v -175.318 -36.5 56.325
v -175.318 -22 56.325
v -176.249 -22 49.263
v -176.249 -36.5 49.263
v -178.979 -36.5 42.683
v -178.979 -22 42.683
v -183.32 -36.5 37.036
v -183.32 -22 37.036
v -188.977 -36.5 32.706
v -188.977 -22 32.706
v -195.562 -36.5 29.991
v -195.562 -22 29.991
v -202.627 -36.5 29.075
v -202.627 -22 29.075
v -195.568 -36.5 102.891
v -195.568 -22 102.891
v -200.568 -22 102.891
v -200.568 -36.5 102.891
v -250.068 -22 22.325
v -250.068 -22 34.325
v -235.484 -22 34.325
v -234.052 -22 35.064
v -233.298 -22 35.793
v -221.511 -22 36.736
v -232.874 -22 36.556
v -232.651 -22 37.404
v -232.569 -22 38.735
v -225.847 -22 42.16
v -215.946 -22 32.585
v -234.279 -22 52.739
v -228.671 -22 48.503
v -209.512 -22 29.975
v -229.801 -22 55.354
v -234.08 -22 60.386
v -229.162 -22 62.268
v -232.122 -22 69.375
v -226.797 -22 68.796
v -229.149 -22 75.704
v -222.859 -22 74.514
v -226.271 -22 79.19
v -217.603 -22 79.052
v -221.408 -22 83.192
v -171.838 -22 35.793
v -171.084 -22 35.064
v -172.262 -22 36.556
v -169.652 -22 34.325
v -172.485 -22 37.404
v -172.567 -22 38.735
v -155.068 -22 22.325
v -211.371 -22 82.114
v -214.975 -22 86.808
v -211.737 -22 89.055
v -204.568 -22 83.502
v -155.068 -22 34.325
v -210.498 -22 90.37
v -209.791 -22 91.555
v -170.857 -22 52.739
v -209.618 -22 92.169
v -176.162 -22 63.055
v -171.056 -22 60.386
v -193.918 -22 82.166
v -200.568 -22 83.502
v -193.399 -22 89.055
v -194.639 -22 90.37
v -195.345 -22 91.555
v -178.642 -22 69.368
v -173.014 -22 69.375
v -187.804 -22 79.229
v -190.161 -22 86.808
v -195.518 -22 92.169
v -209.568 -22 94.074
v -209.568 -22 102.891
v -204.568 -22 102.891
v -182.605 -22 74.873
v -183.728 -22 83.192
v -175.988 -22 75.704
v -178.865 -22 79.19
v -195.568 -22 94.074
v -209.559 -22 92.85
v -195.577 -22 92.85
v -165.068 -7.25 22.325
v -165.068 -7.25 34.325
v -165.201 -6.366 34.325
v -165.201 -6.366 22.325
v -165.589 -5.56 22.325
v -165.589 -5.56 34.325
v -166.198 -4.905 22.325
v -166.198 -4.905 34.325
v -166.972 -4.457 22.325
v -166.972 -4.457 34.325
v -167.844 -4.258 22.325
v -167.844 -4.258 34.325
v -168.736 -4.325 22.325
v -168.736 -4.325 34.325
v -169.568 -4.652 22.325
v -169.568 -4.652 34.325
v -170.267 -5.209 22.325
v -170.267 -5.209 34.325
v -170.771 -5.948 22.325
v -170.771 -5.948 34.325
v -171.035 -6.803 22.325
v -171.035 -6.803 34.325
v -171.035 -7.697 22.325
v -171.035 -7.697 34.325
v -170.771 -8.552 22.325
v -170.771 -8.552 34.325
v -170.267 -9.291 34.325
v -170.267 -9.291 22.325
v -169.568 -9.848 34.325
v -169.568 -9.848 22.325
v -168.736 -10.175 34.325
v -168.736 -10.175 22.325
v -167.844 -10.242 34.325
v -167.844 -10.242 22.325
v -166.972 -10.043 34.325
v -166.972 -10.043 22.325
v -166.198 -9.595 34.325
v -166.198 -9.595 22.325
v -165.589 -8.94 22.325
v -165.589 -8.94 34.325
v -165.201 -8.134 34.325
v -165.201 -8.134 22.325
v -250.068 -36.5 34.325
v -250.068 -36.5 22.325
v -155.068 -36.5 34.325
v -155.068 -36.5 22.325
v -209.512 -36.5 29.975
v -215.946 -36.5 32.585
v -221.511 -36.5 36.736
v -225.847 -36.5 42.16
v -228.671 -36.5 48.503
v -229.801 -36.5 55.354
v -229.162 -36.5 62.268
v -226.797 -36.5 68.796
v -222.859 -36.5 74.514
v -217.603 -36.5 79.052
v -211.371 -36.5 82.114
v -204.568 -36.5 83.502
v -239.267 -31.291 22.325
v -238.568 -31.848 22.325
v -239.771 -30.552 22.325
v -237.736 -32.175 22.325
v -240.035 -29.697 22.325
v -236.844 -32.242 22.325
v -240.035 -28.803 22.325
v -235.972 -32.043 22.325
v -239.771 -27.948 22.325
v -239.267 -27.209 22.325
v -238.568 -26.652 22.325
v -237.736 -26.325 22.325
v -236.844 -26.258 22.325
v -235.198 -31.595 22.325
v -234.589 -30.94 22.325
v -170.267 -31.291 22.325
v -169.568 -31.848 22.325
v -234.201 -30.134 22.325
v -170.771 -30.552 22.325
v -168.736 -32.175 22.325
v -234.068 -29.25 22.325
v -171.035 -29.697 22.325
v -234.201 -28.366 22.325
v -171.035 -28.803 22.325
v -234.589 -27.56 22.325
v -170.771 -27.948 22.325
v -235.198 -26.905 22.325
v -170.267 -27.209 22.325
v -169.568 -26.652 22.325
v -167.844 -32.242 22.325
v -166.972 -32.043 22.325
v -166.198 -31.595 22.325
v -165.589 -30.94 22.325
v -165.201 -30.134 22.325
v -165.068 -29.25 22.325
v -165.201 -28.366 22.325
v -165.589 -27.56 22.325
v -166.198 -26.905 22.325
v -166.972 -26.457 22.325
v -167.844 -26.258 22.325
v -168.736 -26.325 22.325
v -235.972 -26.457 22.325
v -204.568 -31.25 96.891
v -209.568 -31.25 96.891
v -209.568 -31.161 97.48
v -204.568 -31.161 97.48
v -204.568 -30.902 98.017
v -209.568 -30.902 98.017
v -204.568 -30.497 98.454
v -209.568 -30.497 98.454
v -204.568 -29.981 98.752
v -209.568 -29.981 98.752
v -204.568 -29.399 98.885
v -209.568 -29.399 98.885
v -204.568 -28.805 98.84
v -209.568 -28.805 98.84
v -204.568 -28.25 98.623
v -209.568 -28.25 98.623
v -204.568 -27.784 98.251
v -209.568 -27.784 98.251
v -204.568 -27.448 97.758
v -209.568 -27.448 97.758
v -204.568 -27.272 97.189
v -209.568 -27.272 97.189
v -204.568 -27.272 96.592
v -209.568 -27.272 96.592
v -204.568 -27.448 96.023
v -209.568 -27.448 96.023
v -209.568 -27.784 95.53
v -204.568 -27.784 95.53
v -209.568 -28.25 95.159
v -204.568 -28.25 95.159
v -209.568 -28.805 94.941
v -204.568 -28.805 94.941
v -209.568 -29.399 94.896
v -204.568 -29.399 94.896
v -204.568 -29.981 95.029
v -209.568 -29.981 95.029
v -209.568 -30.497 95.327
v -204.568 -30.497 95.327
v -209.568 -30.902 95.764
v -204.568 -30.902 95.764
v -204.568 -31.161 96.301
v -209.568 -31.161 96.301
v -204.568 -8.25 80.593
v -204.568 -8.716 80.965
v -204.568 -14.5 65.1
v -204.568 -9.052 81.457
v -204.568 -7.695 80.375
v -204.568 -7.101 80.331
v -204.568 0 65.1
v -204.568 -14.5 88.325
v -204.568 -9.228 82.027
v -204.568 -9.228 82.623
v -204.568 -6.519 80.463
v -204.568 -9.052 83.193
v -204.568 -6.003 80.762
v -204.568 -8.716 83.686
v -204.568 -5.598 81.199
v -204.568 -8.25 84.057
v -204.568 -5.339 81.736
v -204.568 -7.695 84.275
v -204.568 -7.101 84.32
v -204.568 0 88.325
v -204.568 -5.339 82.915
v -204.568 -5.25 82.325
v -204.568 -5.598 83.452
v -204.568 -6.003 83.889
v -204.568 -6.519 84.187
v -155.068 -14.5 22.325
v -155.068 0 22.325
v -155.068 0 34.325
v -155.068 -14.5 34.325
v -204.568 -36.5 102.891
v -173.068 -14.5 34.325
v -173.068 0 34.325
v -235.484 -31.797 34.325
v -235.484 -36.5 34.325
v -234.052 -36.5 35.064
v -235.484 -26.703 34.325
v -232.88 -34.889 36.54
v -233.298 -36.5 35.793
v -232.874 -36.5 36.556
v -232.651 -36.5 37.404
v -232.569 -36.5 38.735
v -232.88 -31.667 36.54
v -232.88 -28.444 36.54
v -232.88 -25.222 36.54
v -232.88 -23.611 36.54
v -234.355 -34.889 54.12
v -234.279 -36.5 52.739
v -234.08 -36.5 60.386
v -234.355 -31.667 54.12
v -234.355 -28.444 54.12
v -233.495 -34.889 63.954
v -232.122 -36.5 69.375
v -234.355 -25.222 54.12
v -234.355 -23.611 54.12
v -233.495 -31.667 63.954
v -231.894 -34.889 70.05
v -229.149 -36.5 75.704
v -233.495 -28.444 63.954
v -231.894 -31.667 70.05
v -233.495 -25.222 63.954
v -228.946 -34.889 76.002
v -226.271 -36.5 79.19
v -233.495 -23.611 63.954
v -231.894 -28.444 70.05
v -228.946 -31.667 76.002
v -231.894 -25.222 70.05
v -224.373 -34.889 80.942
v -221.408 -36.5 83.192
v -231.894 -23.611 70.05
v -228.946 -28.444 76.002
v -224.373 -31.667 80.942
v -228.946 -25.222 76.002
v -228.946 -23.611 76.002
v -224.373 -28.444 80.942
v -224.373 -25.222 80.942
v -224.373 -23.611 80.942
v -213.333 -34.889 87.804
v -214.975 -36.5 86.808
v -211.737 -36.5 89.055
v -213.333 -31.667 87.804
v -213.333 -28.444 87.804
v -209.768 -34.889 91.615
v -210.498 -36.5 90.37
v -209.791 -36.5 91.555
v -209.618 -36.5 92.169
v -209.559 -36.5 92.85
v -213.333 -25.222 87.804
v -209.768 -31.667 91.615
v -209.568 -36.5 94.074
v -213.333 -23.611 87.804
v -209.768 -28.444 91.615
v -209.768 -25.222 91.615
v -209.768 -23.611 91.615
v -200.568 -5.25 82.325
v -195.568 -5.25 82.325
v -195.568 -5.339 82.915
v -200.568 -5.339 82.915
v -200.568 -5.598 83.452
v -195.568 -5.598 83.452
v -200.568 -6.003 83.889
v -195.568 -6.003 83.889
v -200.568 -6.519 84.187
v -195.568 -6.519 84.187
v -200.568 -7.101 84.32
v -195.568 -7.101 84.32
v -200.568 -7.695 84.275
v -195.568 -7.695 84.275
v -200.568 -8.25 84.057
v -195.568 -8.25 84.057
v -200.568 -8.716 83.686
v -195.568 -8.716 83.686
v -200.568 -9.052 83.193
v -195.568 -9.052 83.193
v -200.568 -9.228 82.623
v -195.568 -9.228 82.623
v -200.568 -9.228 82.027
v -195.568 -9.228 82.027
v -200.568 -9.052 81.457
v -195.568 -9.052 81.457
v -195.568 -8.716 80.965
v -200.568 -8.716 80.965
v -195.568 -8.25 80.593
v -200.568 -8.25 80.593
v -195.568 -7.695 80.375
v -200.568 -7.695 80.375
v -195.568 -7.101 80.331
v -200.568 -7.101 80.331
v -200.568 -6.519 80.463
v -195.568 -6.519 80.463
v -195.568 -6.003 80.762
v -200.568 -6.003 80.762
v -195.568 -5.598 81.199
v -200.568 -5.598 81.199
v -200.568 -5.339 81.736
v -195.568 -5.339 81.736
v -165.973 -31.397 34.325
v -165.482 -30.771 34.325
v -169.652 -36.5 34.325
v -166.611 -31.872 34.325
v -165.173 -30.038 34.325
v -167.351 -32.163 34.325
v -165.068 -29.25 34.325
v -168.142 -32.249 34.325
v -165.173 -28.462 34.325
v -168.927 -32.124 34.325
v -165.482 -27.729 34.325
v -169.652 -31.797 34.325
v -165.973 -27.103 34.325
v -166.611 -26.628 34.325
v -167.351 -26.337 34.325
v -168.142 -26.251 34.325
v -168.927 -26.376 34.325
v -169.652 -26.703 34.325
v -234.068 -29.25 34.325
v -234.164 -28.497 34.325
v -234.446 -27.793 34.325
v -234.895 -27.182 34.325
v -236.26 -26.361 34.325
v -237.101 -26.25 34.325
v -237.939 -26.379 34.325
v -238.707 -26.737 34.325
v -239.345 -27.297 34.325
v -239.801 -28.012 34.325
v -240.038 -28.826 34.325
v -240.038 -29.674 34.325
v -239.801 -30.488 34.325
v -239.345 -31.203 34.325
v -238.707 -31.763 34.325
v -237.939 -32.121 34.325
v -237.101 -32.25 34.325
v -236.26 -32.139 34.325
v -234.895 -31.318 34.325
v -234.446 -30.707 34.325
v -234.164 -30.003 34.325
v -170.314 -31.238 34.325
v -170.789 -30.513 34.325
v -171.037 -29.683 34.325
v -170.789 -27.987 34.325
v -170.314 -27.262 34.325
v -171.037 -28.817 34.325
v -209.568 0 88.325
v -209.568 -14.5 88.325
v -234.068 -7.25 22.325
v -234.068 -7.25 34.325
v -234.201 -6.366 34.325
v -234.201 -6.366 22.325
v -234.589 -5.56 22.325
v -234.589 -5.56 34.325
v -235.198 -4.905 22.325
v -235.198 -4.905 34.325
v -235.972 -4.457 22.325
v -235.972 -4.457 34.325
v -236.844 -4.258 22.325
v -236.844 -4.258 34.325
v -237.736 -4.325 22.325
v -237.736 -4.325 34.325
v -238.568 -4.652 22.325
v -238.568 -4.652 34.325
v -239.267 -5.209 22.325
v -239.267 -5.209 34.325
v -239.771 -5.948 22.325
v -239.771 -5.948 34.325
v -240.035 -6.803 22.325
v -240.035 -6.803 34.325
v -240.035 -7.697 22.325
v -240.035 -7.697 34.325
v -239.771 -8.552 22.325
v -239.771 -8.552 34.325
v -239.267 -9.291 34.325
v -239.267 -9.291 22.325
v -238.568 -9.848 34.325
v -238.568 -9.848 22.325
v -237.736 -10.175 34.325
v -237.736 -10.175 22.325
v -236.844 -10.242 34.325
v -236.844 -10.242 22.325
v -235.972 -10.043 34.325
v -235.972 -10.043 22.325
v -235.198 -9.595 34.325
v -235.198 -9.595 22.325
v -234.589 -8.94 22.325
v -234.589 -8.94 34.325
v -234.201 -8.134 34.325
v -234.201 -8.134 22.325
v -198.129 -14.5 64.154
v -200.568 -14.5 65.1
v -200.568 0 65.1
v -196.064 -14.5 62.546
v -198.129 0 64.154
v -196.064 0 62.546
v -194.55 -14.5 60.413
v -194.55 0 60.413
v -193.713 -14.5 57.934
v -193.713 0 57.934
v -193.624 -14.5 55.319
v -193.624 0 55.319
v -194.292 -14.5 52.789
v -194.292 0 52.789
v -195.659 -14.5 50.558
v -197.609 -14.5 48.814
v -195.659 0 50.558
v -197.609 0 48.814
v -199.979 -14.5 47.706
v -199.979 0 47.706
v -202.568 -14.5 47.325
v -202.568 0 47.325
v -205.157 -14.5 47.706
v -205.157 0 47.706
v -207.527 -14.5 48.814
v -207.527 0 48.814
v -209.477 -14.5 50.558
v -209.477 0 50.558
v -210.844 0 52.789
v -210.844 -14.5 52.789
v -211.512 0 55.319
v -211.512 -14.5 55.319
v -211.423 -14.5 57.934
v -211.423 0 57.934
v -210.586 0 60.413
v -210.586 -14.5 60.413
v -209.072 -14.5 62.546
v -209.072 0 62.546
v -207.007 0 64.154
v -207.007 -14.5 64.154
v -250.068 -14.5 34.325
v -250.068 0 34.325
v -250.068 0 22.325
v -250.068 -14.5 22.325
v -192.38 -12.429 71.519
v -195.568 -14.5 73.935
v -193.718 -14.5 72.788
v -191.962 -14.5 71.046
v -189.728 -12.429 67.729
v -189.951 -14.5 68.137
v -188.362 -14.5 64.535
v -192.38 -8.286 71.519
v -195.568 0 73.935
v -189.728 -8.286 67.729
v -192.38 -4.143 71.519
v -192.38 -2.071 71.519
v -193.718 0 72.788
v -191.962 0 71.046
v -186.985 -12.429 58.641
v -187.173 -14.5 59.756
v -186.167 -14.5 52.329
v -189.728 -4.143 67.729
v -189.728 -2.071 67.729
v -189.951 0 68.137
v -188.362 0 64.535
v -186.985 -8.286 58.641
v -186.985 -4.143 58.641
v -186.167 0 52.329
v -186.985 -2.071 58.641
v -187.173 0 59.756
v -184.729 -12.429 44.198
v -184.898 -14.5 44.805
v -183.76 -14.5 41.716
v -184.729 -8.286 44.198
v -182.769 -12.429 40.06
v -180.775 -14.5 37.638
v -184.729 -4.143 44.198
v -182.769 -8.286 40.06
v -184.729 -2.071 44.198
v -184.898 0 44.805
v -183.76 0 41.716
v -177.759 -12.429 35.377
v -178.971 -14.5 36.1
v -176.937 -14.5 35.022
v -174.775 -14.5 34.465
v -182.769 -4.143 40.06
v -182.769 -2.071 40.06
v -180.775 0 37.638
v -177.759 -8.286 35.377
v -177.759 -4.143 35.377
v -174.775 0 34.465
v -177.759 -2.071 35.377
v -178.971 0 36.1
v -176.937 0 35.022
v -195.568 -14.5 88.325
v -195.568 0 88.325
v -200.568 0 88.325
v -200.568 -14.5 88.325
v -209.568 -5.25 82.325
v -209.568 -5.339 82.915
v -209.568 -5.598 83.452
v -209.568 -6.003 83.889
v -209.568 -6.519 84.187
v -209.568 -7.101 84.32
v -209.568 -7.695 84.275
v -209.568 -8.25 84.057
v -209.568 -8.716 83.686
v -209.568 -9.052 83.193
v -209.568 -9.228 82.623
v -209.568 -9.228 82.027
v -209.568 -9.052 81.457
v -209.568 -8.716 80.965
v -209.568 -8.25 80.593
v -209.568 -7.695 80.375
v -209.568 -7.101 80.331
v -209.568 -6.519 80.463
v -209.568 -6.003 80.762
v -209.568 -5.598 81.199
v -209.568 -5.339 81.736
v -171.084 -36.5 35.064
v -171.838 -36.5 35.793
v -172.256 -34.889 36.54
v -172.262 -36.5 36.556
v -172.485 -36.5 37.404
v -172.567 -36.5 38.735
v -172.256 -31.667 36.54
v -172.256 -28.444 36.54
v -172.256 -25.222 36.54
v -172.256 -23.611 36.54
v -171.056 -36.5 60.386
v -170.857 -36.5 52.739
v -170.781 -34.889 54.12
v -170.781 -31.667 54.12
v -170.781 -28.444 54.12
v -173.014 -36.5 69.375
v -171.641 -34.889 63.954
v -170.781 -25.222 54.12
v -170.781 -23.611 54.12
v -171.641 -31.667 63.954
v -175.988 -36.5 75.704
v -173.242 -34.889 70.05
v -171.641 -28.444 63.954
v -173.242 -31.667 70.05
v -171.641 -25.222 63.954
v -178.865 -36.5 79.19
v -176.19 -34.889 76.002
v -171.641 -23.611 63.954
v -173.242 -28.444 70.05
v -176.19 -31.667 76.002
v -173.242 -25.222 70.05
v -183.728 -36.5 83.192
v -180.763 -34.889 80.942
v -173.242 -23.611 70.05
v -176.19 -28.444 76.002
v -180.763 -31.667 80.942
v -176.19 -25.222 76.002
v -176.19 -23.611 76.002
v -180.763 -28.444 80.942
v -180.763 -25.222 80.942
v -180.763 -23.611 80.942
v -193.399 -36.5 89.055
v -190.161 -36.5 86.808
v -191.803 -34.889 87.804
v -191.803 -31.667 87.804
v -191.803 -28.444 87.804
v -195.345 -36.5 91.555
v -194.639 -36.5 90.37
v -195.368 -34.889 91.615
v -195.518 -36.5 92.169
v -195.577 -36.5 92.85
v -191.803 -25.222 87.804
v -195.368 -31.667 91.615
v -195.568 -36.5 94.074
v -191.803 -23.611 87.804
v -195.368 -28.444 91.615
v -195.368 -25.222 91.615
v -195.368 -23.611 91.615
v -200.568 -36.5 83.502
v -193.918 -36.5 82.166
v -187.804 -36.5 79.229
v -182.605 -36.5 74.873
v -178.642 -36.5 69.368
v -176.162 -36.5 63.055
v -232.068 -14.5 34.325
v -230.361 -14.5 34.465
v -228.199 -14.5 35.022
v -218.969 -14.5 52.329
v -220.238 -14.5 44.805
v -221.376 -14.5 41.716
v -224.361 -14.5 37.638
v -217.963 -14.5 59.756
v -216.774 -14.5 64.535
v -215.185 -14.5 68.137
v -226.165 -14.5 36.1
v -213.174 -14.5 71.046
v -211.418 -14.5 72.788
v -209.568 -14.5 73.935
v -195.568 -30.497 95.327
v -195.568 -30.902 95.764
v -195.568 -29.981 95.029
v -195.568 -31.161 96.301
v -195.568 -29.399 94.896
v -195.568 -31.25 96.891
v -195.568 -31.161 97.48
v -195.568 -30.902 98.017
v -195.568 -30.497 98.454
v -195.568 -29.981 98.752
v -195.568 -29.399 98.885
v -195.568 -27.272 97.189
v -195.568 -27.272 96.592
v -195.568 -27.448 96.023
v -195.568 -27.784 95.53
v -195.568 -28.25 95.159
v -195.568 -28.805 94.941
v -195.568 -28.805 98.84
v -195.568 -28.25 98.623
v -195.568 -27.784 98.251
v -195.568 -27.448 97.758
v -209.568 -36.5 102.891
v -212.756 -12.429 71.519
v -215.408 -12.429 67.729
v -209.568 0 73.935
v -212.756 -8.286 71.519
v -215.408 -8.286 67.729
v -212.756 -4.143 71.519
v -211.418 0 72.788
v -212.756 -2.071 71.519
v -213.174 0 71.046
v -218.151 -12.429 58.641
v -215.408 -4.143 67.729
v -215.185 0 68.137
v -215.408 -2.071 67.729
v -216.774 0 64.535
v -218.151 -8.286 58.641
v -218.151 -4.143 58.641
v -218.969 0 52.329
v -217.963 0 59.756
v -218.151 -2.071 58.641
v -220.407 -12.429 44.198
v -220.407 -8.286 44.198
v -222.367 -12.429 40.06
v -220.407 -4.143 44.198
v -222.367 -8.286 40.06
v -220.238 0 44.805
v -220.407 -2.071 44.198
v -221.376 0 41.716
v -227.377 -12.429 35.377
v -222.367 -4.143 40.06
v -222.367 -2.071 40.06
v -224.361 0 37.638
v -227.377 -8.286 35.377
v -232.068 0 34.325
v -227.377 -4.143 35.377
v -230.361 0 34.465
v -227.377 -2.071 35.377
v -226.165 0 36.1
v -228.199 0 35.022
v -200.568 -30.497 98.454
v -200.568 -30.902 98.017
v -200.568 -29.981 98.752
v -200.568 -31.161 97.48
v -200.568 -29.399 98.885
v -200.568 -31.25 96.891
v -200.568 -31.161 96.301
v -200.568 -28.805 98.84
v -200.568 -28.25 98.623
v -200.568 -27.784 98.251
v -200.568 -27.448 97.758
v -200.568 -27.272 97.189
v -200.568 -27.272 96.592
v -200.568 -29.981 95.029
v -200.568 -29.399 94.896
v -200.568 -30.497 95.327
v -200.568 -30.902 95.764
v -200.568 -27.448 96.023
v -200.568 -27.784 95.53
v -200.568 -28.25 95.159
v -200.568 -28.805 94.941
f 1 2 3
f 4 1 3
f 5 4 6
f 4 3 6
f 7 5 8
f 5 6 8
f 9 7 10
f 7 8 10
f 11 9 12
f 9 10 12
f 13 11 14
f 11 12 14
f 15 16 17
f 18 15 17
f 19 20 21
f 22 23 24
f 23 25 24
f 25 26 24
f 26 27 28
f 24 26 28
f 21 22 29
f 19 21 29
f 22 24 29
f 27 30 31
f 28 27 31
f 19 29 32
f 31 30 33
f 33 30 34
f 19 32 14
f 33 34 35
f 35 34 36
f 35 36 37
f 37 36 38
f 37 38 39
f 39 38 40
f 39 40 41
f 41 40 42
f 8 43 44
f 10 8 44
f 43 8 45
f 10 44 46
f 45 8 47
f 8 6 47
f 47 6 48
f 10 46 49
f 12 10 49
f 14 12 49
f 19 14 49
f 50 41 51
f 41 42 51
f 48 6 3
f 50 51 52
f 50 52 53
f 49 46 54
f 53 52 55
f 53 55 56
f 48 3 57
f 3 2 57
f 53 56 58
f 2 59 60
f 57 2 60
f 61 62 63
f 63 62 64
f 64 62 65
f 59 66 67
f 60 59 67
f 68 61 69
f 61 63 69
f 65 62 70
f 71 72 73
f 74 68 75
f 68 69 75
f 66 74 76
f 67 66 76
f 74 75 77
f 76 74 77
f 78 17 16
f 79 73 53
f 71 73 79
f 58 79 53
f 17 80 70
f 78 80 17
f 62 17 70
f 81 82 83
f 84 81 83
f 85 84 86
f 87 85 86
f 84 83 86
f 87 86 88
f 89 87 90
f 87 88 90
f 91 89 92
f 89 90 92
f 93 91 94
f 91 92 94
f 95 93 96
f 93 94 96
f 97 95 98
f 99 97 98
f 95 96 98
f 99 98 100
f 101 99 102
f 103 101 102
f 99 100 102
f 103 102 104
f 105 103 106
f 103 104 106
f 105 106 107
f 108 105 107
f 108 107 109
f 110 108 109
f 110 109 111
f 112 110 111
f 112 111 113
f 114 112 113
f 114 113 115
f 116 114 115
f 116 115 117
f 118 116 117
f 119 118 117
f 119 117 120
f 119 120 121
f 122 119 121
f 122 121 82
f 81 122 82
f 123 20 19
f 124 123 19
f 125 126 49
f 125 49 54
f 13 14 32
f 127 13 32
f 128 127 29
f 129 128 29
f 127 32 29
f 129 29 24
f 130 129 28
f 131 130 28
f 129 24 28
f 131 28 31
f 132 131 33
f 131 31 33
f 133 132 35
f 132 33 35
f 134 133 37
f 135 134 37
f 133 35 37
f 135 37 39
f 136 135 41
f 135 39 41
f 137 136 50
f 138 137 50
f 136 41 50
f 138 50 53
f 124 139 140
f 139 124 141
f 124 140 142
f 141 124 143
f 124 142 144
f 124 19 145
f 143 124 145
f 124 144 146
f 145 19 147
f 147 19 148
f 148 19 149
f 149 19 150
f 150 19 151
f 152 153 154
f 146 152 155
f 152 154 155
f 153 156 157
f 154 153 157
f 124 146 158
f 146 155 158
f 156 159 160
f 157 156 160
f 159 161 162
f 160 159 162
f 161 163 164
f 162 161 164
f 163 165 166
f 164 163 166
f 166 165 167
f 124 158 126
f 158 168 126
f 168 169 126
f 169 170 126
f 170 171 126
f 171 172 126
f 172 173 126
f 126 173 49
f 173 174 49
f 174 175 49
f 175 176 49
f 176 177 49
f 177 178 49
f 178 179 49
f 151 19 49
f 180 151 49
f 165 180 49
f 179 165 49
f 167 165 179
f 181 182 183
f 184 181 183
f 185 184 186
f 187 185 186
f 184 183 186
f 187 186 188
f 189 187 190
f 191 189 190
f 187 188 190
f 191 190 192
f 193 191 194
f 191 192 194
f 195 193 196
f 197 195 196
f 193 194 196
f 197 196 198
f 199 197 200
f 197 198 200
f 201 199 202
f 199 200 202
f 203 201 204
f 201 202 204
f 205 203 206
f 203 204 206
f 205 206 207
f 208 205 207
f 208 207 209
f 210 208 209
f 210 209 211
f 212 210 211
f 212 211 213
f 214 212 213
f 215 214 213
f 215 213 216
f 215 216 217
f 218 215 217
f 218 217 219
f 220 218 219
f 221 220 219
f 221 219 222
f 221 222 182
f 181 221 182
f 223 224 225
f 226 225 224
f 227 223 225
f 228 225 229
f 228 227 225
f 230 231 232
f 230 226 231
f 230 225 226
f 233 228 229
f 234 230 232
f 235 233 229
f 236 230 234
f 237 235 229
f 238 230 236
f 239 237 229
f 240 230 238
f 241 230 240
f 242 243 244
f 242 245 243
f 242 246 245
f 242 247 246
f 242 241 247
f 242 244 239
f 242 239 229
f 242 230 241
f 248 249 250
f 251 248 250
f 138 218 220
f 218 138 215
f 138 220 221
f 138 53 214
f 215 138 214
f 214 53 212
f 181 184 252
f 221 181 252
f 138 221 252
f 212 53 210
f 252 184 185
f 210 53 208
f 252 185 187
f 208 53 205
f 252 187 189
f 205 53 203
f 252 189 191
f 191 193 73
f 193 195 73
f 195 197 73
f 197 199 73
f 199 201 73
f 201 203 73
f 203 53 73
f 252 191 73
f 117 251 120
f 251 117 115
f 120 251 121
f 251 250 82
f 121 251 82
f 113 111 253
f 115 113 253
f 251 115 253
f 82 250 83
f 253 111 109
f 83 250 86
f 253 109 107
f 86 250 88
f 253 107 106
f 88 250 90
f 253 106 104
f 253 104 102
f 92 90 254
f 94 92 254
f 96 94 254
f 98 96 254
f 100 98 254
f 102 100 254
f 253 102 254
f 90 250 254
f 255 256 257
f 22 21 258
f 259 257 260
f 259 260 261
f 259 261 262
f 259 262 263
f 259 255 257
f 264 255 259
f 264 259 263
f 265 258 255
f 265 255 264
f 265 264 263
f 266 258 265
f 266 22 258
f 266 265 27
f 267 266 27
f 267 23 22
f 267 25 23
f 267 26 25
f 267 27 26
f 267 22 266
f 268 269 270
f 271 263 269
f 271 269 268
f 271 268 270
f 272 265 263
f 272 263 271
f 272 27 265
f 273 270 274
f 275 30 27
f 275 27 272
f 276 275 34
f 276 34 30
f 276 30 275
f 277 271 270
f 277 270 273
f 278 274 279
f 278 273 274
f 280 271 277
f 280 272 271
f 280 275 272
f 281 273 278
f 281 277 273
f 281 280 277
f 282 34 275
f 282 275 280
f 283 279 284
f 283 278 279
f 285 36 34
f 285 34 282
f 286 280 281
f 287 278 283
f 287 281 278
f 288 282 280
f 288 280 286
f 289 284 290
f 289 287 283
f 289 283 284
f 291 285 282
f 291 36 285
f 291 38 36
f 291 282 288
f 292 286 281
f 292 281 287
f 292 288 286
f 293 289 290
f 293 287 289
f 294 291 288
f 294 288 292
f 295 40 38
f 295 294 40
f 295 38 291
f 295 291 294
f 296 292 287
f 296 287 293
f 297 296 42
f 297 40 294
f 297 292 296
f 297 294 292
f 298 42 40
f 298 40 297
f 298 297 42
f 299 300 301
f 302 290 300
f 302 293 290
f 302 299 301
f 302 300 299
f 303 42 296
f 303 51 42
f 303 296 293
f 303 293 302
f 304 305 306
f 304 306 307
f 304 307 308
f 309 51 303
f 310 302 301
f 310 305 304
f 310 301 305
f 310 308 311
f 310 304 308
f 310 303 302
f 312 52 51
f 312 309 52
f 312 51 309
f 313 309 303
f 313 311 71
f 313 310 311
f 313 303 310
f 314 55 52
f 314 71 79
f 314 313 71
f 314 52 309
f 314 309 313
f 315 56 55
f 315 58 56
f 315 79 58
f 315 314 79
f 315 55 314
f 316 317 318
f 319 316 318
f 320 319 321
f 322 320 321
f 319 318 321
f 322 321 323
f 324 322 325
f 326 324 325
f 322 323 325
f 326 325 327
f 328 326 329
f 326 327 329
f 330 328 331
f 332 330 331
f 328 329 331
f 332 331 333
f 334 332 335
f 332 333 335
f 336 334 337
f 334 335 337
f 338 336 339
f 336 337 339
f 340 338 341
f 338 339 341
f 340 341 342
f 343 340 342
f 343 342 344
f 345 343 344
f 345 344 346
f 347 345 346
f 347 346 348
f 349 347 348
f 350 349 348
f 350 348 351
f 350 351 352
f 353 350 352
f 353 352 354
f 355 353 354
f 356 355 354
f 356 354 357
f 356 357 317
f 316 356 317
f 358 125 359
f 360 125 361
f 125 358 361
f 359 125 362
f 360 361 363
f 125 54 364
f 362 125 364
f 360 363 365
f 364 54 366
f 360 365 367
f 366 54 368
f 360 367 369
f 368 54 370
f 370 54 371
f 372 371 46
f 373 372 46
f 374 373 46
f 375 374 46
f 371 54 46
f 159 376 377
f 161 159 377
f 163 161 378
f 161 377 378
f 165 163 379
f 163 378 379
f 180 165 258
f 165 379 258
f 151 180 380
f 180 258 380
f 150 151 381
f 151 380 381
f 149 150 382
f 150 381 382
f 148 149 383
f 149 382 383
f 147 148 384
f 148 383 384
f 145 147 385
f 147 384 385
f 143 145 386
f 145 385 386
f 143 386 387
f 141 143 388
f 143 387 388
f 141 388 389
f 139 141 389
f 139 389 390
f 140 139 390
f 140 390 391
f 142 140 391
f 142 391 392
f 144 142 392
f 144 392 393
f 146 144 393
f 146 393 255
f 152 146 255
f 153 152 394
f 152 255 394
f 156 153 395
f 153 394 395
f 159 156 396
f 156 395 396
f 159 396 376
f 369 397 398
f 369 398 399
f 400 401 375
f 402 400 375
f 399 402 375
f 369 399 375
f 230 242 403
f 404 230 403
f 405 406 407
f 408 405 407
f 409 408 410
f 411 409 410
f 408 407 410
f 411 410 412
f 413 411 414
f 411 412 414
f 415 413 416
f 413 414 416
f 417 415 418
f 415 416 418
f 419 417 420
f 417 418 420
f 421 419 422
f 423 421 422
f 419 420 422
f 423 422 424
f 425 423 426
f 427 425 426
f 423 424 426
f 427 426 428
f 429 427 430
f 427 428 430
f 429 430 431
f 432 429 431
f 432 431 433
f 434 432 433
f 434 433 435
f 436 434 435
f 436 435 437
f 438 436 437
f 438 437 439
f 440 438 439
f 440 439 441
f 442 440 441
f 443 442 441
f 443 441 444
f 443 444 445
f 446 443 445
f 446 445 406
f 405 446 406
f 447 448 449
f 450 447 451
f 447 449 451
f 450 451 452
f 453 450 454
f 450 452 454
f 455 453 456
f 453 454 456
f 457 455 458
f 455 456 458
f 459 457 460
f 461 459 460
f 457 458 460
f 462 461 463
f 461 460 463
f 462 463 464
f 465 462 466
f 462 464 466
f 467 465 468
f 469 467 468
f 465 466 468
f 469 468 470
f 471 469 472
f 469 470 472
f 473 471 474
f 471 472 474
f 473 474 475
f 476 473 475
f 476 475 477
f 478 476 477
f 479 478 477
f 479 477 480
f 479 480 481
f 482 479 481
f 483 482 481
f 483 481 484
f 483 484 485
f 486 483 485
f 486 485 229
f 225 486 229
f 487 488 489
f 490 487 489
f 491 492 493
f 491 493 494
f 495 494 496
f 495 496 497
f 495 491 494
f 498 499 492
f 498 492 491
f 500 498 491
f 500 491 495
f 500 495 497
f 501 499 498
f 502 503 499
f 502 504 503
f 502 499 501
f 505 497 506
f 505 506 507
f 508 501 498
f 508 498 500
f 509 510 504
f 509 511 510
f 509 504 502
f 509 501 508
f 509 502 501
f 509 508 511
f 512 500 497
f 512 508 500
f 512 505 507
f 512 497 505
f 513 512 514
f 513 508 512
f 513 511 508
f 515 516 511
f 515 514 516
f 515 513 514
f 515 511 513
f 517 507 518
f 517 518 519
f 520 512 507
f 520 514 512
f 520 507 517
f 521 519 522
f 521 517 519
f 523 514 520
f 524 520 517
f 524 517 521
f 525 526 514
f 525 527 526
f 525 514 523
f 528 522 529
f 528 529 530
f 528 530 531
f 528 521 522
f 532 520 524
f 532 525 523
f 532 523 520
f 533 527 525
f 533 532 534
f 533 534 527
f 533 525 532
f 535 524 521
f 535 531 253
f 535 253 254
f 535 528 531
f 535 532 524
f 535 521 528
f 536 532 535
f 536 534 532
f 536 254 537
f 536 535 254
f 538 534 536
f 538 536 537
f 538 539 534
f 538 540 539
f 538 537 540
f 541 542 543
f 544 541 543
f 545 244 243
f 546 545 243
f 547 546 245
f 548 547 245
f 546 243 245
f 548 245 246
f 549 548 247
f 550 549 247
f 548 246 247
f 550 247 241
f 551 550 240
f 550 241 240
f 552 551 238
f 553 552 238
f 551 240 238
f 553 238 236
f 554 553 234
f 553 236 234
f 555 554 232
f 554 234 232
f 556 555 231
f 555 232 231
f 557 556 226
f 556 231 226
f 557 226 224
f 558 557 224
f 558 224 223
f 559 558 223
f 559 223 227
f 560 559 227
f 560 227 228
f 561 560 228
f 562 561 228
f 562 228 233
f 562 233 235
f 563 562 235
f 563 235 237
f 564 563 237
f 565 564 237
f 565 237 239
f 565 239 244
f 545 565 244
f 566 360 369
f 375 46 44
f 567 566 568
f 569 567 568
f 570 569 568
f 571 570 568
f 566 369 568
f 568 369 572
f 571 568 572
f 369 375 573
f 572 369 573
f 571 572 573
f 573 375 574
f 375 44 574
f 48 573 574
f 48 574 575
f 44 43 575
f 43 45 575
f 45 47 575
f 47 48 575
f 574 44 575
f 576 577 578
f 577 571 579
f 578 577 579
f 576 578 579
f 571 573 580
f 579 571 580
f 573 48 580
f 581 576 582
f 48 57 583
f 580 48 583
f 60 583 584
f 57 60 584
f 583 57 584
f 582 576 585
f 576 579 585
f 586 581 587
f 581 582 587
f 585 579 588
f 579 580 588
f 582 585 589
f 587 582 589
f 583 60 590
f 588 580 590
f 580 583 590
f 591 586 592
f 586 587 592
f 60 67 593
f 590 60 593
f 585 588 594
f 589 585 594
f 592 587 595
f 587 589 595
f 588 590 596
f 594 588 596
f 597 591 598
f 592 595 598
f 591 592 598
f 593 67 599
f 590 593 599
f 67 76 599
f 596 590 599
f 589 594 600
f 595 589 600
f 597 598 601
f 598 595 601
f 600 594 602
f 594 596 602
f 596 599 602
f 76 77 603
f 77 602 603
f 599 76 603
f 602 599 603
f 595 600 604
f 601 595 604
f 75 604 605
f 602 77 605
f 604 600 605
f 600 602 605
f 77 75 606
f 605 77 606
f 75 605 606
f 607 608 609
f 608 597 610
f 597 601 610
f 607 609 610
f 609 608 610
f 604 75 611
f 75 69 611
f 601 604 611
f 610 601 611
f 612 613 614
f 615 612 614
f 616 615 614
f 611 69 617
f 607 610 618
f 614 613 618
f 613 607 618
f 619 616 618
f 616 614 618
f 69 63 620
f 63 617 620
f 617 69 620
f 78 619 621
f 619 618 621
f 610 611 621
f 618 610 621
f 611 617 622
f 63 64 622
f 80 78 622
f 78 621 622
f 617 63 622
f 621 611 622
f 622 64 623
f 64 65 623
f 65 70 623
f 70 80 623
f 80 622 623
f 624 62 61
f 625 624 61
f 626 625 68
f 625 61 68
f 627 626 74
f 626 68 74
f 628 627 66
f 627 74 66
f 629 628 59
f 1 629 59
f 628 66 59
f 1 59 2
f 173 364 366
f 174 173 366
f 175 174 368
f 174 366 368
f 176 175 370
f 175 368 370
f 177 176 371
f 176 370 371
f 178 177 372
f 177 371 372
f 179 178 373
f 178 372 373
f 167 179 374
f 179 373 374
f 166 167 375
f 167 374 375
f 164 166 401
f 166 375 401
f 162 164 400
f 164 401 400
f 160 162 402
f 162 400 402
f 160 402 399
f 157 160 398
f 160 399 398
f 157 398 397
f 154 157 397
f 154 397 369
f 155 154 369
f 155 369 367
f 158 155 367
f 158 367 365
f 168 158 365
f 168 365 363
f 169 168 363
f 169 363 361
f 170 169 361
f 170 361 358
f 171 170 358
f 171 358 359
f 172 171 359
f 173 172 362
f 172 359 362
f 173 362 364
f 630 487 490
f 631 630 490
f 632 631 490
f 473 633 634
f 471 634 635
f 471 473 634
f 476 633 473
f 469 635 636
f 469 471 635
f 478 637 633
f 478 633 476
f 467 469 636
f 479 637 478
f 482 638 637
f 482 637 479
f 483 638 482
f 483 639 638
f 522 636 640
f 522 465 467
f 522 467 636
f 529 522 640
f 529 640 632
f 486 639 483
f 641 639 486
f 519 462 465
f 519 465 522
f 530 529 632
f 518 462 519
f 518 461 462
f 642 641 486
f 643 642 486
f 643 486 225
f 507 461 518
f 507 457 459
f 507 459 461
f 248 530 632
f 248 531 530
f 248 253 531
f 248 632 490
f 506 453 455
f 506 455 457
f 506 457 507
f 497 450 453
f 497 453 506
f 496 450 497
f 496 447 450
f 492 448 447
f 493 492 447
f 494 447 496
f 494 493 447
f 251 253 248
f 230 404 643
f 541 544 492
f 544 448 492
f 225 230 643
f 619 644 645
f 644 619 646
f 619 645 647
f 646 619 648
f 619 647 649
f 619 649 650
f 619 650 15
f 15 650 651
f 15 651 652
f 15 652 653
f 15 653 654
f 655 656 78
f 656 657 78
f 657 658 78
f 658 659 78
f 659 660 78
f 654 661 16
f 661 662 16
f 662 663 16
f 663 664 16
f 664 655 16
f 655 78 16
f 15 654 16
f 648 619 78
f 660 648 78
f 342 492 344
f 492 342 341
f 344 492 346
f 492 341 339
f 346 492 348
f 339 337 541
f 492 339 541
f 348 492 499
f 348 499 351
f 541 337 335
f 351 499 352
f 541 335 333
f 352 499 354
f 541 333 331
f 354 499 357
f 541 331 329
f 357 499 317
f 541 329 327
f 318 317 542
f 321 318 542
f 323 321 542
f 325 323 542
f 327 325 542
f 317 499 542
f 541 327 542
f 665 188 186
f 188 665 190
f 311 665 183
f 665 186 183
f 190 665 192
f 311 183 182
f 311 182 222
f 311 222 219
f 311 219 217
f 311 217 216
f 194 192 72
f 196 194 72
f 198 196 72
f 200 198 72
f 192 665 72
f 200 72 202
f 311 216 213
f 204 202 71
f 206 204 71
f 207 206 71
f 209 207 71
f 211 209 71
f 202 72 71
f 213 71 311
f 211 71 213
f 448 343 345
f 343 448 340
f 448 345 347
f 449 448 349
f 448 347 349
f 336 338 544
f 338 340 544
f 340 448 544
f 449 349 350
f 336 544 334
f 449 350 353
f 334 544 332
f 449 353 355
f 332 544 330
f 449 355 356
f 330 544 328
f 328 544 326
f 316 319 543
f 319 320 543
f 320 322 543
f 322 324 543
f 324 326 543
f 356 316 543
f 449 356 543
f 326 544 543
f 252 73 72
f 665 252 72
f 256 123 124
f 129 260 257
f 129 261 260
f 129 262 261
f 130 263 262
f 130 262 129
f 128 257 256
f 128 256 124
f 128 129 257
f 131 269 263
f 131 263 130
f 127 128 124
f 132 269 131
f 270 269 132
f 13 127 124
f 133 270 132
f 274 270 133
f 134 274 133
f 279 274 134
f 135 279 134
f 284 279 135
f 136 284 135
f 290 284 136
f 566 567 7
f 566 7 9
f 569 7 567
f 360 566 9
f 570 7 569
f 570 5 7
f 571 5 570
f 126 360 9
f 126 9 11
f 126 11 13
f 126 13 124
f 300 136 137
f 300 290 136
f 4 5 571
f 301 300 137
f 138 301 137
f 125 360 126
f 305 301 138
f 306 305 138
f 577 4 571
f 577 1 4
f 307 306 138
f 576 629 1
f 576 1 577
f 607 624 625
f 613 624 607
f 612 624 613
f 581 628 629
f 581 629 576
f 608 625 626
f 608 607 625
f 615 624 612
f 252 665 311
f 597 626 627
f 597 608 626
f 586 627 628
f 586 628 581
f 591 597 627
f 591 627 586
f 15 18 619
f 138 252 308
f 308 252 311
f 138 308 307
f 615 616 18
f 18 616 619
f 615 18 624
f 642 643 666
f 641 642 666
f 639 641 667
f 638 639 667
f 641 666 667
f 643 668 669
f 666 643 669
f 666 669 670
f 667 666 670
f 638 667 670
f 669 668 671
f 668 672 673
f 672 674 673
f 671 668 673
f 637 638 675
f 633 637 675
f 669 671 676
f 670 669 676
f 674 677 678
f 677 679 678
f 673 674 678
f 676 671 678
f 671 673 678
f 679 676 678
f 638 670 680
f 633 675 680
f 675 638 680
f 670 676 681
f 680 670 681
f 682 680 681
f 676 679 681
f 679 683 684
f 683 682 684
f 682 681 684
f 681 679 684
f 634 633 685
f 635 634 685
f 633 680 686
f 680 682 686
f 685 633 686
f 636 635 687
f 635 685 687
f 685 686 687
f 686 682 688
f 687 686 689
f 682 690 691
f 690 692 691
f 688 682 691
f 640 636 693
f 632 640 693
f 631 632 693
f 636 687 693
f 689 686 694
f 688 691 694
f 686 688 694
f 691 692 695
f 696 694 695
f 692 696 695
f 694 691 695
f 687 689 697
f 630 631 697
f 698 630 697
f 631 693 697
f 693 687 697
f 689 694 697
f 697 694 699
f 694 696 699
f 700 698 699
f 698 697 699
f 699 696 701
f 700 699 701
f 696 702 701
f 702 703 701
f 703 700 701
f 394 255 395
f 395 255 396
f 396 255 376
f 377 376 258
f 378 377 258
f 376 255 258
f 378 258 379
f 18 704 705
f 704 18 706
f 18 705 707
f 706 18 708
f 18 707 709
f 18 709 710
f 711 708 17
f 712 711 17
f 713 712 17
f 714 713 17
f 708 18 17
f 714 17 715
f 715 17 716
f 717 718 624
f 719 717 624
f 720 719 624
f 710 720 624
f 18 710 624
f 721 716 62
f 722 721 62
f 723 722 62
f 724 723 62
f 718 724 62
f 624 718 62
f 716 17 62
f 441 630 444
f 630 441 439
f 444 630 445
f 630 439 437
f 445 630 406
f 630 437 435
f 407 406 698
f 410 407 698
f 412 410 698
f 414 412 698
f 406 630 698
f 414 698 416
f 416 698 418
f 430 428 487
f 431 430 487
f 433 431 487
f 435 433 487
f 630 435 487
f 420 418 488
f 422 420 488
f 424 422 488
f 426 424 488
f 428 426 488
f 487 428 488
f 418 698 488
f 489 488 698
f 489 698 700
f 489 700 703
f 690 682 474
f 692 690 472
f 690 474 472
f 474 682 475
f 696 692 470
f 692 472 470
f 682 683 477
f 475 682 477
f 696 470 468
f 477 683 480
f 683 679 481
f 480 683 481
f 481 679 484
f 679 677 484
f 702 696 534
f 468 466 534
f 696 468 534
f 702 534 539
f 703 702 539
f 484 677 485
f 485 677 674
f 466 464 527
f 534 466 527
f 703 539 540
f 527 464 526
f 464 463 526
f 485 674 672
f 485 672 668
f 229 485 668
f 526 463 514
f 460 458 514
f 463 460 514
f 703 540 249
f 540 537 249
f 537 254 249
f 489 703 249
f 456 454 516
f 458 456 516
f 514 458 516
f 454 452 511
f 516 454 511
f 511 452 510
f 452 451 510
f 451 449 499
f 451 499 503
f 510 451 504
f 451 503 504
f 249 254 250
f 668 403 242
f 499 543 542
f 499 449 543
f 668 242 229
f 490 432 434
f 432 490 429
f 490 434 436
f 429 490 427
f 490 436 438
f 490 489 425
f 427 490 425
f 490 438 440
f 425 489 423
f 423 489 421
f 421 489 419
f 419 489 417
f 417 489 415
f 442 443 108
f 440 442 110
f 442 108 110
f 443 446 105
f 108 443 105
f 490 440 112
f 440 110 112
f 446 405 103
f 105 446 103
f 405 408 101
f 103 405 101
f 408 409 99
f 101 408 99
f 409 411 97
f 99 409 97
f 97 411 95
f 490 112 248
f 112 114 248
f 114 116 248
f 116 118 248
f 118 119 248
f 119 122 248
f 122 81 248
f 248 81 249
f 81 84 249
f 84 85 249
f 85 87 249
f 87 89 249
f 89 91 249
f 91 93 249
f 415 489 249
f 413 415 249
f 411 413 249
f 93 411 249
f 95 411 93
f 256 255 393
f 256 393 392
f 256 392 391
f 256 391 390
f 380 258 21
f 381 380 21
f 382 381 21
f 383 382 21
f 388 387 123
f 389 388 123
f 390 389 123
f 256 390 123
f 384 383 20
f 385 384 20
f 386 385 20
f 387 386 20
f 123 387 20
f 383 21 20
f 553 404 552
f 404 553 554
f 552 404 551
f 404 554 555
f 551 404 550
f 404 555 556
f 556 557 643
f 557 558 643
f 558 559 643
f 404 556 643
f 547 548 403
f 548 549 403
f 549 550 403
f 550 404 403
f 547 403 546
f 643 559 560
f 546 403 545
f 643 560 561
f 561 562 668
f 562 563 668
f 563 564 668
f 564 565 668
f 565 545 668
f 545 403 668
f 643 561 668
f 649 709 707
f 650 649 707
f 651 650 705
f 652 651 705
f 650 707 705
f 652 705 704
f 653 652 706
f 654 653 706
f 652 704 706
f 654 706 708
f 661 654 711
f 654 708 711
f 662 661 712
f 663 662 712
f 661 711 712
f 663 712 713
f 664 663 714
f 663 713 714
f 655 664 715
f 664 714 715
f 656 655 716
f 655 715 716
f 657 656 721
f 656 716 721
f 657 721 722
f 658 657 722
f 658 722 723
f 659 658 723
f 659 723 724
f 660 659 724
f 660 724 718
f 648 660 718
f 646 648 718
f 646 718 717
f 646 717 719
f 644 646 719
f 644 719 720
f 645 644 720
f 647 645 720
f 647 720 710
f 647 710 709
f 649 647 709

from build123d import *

# Parameters (mm, degrees)
F2_DEPTH  = 14.5
F3_R      = 3
F4_DEPTH  = 25
F5_W      = 4
F5_H      = 14.5
F6_DEPTH  = 25
F7_R      = 2
F8_DEPTH  = 25
F11_DEPTH = 14.5
F12_R     = 3
F13_DEPTH = 25
F14_R     = 2
F15_DEPTH = 25


with BuildPart() as f2:
    # F1 (on face) → F2 (new body)
    with BuildSketch(Plane.XZ):
        with BuildLine():
            Line((-202.5680201617, 65.3251916903), (-202.5680201617, 88.3251916903))
            Line((-202.5680201617, 88.3251916903), (-209.5680201617, 88.3251916903))
            Line((-209.5680201617, 88.3251916903), (-209.5680201617, 73.9349819805))
            add(Edge.make_bspline(
                [(-209.5680201617, 73.9349819805), (-211.7439716774, 73.0181878643), (-216.2726052613, 67.7985303627), (-218.3331884568, 58.75580514), (-219.0857934458, 50.5969995569), (-220.199689377, 44.137135842), (-222.0891199342, 39.9480032137), (-226.803489677, 34.7602491031), (-231.0267011323, 34.3251916903), (-232.0680201617, 34.3251916903)],
                knots=[0, 0, 0, 0, 0.1591101706, 0.3270353536, 0.4840931463, 0.6211344746, 0.7377657249, 0.8804923771, 1, 1, 1, 1], degree=3))
            Line((-232.0680201617, 34.3251916903), (-250.0680201617, 34.3251916903))
            Line((-250.0680201617, 34.3251916903), (-250.0680201617, 22.3251916903))
            Line((-250.0680201617, 22.3251916903), (-202.5680201617, 22.3251916903))
            Line((-202.5680201617, 22.3251916903), (-202.5680201617, 47.3251916903))
            ThreePointArc((-202.5680201617, 47.3251916903), (-211.5680201617, 56.3251916903), (-202.5680201617, 65.3251916903))
        make_face()
        with BuildLine():
            Line((-195.5680201617, 88.3251916903), (-202.5680201617, 88.3251916903))
            Line((-202.5680201617, 88.3251916903), (-202.5680201617, 65.3251916903))
            ThreePointArc((-202.5680201617, 65.3251916903), (-193.5680201617, 56.3251916903), (-202.5680201617, 47.3251916903))
            Line((-202.5680201617, 47.3251916903), (-202.5680201617, 22.3251916903))
            Line((-202.5680201617, 22.3251916903), (-155.0680201617, 22.3251916903))
            Line((-155.0680201617, 22.3251916903), (-155.0680201617, 34.3251916903))
            Line((-155.0680201617, 34.3251916903), (-173.0680201617, 34.3251916903))
            add(Edge.make_bspline(
                [(-195.5680201617, 73.9349819805), (-193.392068646, 73.0181878643), (-188.863435062, 67.7985303627), (-186.8028518665, 58.75580514), (-186.0502468775, 50.5969995569), (-184.9363509464, 44.137135842), (-183.0469203892, 39.9480032137), (-178.3325506464, 34.7602491031), (-174.109339191, 34.3251916903), (-173.0680201617, 34.3251916903)],
                knots=[0, 0, 0, 0, 0.1591101706, 0.3270353536, 0.4840931463, 0.6211344746, 0.7377657249, 0.8804923771, 1, 1, 1, 1], degree=3))
            Line((-195.5680201617, 73.9349819805), (-195.5680201617, 88.3251916903))
        make_face()
    extrude(amount=F2_DEPTH)

    # F3 (on face) → F4 (cut)
    with BuildSketch(Plane.XY.offset(34.3251916903)):
        with Locations((-237.0680201617, -7.25)):
            Circle(F3_R)
        with Locations((-168.0680201617, -7.25)):
            Circle(F3_R)
    extrude(amount=-F4_DEPTH, mode=Mode.SUBTRACT)

    # F5 (on face) → F6 (cut)
    with BuildSketch(Plane.XY.offset(88.3251916903)):
        with Locations((-202.5680201617, -7.25)):
            Rectangle(F5_W, F5_H)
    extrude(amount=-F6_DEPTH, mode=Mode.SUBTRACT)

    # F7 (on face) → F8 (cut)
    with BuildSketch(Plane.YZ.offset(-195.5680201617)):
        with Locations((-7.25, 82.3251916903)):
            Circle(F7_R)
    extrude(amount=-F8_DEPTH, mode=Mode.SUBTRACT)


with BuildPart() as f11:
    # F10 (on offset) → F11 (new body)
    with BuildSketch(Plane.XZ.offset(22)):
        with BuildLine():
            Line((-202.6266263647, 22.3251916903), (-202.6266263647, 29.0752547122))
            ThreePointArc((-202.6266263647, 29.0752547122), (-229.8007008876, 55.3538006871), (-204.5680201617, 83.5016980883))
            Line((-204.5680201617, 83.5016980883), (-204.5680201617, 102.890573442))
            Line((-204.5680201617, 102.890573442), (-209.5680201617, 102.890573442))
            Line((-209.5680201617, 102.890573442), (-209.5680201617, 94.0735563636))
            add(Edge.make_bspline(
                [(-235.4835533467, 34.3251916903), (-234.2076045099, 34.8032106649), (-232.0875761704, 36.3645413181), (-233.0333190955, 43.0886671998), (-234.8395213207, 54.3273465748), (-233.7960622807, 63.9566738497), (-230.2921019868, 76.7310885142), (-219.6514869865, 84.8193184868), (-213.4870202974, 87.2101328255), (-209.205947769, 91.3388803607), (-209.6027707631, 93.2862840105), (-209.5680201617, 94.0735563636)],
                knots=[0, 0, 0, 0, 0.0754379169, 0.1766112941, 0.3150596134, 0.4432663677, 0.5896926426, 0.7356900989, 0.8426999539, 0.935912944, 1, 1, 1, 1], degree=3))
            Line((-235.4835533467, 34.3251916903), (-250.0680201617, 34.3251916903))
            Line((-250.0680201617, 34.3251916903), (-250.0680201617, 22.3251916903))
            Line((-250.0680201617, 22.3251916903), (-202.6266263647, 22.3251916903))
        make_face()
        with BuildLine():
            ThreePointArc((-200.5680201617, 83.5016980883), (-182.6047726804, 74.8732711057), (-175.3180201617, 56.3251916903))
            ThreePointArc((-175.3180201617, 56.3251916903), (-183.3200919489, 37.03582261), (-202.6266263647, 29.0752547122))
            Line((-202.6266263647, 29.0752547122), (-202.6266263647, 22.3251916903))
            Line((-202.6266263647, 22.3251916903), (-202.5094139586, 22.3251916903))
            Line((-202.5094139586, 22.3251916903), (-155.0680201617, 22.3251916903))
            Line((-155.0680201617, 22.3251916903), (-155.0680201617, 34.3251916903))
            Line((-155.0680201617, 34.3251916903), (-169.6524869767, 34.3251916903))
            add(Edge.make_bspline(
                [(-169.6524869767, 34.3251916903), (-170.9284358134, 34.8032106649), (-173.048464153, 36.3645413181), (-172.1027212278, 43.0886671998), (-170.2965190026, 54.3273465748), (-171.3399780427, 63.9566738497), (-174.8439383366, 76.7310885142), (-185.4845533369, 84.8193184868), (-191.649020026, 87.2101328255), (-195.9300925543, 91.3388803607), (-195.5332695603, 93.2862840105), (-195.5680201617, 94.0735563636)],
                knots=[0, 0, 0, 0, 0.0754379169, 0.1766112941, 0.3150596134, 0.4432663677, 0.5896926426, 0.7356900989, 0.8426999539, 0.935912944, 1, 1, 1, 1], degree=3))
            Line((-195.5680201617, 94.0735563636), (-195.5680201617, 102.890573442))
            Line((-195.5680201617, 102.890573442), (-200.5680201617, 102.890573442))
            Line((-200.5680201617, 102.890573442), (-200.5680201617, 83.5016980883))
        make_face()
    extrude(amount=F11_DEPTH)

    # F12 (on face) → F13 (cut)
    with BuildSketch(Plane.XY.offset(34.3251916903)):
        with Locations((-237.0680201617, -29.25)):
            Circle(F12_R)
        with Locations((-168.0680201617, -29.25)):
            Circle(F12_R)
    extrude(amount=-F13_DEPTH, mode=Mode.SUBTRACT)

    # F14 (on face) → F15 (cut)
    with BuildSketch(Plane(origin=(-209.5680201617, 0, 0), x_dir=(0, -1, 0), z_dir=(-1, 0, 0))):
        with Locations((29.25, 96.890573442)):
            Circle(F14_R)
    extrude(amount=-F15_DEPTH, mode=Mode.SUBTRACT)


solid = Compound([f2.part, f11.part])
